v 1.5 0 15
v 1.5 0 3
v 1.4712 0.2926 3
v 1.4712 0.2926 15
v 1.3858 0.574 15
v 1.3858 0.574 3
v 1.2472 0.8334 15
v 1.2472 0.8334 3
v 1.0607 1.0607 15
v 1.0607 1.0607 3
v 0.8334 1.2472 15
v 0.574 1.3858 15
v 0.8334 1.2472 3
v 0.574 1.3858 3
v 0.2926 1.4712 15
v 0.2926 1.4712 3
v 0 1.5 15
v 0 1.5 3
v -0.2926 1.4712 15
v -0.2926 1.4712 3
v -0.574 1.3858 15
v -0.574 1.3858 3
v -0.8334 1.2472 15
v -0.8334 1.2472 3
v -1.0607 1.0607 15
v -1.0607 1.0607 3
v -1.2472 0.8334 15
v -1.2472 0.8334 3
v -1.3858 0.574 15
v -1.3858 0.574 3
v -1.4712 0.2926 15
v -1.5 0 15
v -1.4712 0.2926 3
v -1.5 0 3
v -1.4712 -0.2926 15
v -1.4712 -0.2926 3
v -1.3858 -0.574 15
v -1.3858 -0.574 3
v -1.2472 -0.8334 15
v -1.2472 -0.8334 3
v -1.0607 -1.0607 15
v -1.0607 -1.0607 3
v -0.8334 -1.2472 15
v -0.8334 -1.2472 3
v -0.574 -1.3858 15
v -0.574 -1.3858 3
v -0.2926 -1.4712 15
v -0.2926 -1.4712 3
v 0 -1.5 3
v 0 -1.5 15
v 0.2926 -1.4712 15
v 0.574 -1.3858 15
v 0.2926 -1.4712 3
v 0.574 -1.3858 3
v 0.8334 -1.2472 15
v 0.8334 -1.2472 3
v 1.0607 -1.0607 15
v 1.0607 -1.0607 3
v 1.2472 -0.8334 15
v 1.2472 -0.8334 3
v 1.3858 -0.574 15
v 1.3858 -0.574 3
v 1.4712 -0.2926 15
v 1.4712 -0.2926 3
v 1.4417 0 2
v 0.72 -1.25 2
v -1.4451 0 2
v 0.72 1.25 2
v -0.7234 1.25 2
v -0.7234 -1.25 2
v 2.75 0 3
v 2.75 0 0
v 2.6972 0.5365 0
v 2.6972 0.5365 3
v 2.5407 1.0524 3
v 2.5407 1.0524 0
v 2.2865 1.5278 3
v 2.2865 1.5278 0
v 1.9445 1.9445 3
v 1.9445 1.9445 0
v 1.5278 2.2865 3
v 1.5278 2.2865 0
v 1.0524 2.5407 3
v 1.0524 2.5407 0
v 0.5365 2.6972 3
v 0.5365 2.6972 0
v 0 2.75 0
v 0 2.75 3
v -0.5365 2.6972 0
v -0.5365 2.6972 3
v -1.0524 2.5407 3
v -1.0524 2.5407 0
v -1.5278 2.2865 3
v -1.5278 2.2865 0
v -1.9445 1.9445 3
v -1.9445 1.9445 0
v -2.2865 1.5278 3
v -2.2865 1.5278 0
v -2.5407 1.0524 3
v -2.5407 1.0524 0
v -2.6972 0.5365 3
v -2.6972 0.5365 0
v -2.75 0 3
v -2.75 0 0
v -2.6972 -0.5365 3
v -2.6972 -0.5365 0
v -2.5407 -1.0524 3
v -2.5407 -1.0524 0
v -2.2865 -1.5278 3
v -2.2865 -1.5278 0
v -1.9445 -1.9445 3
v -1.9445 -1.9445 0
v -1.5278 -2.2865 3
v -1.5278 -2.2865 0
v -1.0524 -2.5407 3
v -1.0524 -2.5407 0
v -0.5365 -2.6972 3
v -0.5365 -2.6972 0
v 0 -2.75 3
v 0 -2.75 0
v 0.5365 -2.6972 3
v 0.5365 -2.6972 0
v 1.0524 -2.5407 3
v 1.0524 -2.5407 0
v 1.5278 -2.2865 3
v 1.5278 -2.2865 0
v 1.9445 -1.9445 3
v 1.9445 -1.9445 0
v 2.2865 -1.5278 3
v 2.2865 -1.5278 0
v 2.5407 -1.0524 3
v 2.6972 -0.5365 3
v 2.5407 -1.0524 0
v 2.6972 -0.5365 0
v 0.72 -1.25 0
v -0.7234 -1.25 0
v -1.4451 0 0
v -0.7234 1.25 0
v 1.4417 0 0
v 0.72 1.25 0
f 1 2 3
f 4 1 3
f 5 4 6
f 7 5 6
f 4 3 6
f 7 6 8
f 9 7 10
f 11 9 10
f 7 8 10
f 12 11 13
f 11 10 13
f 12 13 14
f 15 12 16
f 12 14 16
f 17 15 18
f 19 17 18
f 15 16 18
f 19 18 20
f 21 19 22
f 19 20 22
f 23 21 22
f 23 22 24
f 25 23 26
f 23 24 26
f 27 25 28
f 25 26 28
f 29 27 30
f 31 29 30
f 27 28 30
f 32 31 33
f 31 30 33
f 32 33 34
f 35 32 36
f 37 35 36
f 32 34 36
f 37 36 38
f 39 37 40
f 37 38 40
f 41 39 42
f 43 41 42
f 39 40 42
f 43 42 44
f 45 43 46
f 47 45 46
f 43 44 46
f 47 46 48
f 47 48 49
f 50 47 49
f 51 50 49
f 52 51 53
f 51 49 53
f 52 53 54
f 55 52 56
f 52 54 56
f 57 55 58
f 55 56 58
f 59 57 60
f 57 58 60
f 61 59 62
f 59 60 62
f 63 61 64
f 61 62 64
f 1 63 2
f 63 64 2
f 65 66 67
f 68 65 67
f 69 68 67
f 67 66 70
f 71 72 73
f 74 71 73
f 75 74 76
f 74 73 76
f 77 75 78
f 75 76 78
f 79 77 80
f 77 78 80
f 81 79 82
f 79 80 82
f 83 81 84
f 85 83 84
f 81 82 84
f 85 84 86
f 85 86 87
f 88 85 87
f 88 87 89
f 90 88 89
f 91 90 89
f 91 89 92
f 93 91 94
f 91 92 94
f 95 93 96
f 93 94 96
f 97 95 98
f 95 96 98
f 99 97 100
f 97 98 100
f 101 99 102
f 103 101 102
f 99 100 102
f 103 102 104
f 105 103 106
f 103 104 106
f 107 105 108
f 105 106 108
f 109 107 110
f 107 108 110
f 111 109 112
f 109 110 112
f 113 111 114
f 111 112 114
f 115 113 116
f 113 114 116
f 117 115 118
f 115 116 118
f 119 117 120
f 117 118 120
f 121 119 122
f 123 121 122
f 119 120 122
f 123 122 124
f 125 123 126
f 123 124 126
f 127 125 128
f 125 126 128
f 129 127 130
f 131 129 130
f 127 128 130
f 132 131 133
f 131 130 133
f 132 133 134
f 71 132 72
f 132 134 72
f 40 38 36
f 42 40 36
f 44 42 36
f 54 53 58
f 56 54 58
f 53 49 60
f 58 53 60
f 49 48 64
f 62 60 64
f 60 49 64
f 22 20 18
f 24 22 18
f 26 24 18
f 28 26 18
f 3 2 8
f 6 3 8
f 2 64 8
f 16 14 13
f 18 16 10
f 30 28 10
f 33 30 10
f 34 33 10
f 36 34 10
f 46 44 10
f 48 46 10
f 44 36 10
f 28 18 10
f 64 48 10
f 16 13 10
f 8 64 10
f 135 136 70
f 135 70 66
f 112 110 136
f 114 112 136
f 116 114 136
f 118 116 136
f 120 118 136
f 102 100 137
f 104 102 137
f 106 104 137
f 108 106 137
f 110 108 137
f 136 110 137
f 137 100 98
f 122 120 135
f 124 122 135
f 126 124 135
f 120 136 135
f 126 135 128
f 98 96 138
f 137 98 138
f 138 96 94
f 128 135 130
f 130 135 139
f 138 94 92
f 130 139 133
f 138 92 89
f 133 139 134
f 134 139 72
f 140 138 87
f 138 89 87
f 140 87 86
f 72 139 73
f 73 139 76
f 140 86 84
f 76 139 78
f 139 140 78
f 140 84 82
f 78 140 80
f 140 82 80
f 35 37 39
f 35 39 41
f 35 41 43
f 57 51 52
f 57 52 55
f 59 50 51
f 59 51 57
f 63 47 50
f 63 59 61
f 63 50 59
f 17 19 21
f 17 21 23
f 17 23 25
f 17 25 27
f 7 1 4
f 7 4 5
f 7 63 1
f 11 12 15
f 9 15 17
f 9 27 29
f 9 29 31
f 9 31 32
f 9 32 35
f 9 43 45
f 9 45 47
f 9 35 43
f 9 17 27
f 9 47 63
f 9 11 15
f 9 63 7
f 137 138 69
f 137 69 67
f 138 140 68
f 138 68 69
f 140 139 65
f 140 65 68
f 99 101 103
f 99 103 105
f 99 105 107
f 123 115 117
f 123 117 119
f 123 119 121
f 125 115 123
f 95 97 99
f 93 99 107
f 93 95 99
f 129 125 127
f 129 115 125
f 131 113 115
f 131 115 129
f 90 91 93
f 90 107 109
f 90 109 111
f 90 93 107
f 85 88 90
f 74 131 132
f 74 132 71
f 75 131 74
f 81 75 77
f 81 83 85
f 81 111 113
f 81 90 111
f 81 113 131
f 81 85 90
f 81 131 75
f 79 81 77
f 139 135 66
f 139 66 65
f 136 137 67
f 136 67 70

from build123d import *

# Parameters (mm, degrees)
CYLINDER001_R     = 1.5
CYLINDER001_DEPTH = 12
CYLINDER_R        = 2.75
CYLINDER_DEPTH    = 3
POCKET_DEPTH      = 2


with BuildPart() as cylinder001:
    # Cylinder001 → Cylinder001 (new body)
    with BuildSketch(Plane.XY.offset(3)):
        Circle(CYLINDER001_R)
    extrude(amount=CYLINDER001_DEPTH)


with BuildPart() as pocket:
    # Cylinder → Cylinder (new body)
    with BuildSketch(Plane.XY):
        Circle(CYLINDER_R)
    extrude(amount=CYLINDER_DEPTH)

    # Sketch → Pocket (cut)
    with BuildSketch(Plane(origin=(0, 0, 0), x_dir=(1, 0, 0), z_dir=(0, 0, -1))):
        Polygon((-1.445063, 0), (-0.723376, 1.25), (0.72, 1.25), (1.441688, 0), (0.72, -1.25), (-0.723375, -1.25), align=None)
    extrude(amount=-POCKET_DEPTH, mode=Mode.SUBTRACT)


solid = Compound([cylinder001.part, pocket.part])
